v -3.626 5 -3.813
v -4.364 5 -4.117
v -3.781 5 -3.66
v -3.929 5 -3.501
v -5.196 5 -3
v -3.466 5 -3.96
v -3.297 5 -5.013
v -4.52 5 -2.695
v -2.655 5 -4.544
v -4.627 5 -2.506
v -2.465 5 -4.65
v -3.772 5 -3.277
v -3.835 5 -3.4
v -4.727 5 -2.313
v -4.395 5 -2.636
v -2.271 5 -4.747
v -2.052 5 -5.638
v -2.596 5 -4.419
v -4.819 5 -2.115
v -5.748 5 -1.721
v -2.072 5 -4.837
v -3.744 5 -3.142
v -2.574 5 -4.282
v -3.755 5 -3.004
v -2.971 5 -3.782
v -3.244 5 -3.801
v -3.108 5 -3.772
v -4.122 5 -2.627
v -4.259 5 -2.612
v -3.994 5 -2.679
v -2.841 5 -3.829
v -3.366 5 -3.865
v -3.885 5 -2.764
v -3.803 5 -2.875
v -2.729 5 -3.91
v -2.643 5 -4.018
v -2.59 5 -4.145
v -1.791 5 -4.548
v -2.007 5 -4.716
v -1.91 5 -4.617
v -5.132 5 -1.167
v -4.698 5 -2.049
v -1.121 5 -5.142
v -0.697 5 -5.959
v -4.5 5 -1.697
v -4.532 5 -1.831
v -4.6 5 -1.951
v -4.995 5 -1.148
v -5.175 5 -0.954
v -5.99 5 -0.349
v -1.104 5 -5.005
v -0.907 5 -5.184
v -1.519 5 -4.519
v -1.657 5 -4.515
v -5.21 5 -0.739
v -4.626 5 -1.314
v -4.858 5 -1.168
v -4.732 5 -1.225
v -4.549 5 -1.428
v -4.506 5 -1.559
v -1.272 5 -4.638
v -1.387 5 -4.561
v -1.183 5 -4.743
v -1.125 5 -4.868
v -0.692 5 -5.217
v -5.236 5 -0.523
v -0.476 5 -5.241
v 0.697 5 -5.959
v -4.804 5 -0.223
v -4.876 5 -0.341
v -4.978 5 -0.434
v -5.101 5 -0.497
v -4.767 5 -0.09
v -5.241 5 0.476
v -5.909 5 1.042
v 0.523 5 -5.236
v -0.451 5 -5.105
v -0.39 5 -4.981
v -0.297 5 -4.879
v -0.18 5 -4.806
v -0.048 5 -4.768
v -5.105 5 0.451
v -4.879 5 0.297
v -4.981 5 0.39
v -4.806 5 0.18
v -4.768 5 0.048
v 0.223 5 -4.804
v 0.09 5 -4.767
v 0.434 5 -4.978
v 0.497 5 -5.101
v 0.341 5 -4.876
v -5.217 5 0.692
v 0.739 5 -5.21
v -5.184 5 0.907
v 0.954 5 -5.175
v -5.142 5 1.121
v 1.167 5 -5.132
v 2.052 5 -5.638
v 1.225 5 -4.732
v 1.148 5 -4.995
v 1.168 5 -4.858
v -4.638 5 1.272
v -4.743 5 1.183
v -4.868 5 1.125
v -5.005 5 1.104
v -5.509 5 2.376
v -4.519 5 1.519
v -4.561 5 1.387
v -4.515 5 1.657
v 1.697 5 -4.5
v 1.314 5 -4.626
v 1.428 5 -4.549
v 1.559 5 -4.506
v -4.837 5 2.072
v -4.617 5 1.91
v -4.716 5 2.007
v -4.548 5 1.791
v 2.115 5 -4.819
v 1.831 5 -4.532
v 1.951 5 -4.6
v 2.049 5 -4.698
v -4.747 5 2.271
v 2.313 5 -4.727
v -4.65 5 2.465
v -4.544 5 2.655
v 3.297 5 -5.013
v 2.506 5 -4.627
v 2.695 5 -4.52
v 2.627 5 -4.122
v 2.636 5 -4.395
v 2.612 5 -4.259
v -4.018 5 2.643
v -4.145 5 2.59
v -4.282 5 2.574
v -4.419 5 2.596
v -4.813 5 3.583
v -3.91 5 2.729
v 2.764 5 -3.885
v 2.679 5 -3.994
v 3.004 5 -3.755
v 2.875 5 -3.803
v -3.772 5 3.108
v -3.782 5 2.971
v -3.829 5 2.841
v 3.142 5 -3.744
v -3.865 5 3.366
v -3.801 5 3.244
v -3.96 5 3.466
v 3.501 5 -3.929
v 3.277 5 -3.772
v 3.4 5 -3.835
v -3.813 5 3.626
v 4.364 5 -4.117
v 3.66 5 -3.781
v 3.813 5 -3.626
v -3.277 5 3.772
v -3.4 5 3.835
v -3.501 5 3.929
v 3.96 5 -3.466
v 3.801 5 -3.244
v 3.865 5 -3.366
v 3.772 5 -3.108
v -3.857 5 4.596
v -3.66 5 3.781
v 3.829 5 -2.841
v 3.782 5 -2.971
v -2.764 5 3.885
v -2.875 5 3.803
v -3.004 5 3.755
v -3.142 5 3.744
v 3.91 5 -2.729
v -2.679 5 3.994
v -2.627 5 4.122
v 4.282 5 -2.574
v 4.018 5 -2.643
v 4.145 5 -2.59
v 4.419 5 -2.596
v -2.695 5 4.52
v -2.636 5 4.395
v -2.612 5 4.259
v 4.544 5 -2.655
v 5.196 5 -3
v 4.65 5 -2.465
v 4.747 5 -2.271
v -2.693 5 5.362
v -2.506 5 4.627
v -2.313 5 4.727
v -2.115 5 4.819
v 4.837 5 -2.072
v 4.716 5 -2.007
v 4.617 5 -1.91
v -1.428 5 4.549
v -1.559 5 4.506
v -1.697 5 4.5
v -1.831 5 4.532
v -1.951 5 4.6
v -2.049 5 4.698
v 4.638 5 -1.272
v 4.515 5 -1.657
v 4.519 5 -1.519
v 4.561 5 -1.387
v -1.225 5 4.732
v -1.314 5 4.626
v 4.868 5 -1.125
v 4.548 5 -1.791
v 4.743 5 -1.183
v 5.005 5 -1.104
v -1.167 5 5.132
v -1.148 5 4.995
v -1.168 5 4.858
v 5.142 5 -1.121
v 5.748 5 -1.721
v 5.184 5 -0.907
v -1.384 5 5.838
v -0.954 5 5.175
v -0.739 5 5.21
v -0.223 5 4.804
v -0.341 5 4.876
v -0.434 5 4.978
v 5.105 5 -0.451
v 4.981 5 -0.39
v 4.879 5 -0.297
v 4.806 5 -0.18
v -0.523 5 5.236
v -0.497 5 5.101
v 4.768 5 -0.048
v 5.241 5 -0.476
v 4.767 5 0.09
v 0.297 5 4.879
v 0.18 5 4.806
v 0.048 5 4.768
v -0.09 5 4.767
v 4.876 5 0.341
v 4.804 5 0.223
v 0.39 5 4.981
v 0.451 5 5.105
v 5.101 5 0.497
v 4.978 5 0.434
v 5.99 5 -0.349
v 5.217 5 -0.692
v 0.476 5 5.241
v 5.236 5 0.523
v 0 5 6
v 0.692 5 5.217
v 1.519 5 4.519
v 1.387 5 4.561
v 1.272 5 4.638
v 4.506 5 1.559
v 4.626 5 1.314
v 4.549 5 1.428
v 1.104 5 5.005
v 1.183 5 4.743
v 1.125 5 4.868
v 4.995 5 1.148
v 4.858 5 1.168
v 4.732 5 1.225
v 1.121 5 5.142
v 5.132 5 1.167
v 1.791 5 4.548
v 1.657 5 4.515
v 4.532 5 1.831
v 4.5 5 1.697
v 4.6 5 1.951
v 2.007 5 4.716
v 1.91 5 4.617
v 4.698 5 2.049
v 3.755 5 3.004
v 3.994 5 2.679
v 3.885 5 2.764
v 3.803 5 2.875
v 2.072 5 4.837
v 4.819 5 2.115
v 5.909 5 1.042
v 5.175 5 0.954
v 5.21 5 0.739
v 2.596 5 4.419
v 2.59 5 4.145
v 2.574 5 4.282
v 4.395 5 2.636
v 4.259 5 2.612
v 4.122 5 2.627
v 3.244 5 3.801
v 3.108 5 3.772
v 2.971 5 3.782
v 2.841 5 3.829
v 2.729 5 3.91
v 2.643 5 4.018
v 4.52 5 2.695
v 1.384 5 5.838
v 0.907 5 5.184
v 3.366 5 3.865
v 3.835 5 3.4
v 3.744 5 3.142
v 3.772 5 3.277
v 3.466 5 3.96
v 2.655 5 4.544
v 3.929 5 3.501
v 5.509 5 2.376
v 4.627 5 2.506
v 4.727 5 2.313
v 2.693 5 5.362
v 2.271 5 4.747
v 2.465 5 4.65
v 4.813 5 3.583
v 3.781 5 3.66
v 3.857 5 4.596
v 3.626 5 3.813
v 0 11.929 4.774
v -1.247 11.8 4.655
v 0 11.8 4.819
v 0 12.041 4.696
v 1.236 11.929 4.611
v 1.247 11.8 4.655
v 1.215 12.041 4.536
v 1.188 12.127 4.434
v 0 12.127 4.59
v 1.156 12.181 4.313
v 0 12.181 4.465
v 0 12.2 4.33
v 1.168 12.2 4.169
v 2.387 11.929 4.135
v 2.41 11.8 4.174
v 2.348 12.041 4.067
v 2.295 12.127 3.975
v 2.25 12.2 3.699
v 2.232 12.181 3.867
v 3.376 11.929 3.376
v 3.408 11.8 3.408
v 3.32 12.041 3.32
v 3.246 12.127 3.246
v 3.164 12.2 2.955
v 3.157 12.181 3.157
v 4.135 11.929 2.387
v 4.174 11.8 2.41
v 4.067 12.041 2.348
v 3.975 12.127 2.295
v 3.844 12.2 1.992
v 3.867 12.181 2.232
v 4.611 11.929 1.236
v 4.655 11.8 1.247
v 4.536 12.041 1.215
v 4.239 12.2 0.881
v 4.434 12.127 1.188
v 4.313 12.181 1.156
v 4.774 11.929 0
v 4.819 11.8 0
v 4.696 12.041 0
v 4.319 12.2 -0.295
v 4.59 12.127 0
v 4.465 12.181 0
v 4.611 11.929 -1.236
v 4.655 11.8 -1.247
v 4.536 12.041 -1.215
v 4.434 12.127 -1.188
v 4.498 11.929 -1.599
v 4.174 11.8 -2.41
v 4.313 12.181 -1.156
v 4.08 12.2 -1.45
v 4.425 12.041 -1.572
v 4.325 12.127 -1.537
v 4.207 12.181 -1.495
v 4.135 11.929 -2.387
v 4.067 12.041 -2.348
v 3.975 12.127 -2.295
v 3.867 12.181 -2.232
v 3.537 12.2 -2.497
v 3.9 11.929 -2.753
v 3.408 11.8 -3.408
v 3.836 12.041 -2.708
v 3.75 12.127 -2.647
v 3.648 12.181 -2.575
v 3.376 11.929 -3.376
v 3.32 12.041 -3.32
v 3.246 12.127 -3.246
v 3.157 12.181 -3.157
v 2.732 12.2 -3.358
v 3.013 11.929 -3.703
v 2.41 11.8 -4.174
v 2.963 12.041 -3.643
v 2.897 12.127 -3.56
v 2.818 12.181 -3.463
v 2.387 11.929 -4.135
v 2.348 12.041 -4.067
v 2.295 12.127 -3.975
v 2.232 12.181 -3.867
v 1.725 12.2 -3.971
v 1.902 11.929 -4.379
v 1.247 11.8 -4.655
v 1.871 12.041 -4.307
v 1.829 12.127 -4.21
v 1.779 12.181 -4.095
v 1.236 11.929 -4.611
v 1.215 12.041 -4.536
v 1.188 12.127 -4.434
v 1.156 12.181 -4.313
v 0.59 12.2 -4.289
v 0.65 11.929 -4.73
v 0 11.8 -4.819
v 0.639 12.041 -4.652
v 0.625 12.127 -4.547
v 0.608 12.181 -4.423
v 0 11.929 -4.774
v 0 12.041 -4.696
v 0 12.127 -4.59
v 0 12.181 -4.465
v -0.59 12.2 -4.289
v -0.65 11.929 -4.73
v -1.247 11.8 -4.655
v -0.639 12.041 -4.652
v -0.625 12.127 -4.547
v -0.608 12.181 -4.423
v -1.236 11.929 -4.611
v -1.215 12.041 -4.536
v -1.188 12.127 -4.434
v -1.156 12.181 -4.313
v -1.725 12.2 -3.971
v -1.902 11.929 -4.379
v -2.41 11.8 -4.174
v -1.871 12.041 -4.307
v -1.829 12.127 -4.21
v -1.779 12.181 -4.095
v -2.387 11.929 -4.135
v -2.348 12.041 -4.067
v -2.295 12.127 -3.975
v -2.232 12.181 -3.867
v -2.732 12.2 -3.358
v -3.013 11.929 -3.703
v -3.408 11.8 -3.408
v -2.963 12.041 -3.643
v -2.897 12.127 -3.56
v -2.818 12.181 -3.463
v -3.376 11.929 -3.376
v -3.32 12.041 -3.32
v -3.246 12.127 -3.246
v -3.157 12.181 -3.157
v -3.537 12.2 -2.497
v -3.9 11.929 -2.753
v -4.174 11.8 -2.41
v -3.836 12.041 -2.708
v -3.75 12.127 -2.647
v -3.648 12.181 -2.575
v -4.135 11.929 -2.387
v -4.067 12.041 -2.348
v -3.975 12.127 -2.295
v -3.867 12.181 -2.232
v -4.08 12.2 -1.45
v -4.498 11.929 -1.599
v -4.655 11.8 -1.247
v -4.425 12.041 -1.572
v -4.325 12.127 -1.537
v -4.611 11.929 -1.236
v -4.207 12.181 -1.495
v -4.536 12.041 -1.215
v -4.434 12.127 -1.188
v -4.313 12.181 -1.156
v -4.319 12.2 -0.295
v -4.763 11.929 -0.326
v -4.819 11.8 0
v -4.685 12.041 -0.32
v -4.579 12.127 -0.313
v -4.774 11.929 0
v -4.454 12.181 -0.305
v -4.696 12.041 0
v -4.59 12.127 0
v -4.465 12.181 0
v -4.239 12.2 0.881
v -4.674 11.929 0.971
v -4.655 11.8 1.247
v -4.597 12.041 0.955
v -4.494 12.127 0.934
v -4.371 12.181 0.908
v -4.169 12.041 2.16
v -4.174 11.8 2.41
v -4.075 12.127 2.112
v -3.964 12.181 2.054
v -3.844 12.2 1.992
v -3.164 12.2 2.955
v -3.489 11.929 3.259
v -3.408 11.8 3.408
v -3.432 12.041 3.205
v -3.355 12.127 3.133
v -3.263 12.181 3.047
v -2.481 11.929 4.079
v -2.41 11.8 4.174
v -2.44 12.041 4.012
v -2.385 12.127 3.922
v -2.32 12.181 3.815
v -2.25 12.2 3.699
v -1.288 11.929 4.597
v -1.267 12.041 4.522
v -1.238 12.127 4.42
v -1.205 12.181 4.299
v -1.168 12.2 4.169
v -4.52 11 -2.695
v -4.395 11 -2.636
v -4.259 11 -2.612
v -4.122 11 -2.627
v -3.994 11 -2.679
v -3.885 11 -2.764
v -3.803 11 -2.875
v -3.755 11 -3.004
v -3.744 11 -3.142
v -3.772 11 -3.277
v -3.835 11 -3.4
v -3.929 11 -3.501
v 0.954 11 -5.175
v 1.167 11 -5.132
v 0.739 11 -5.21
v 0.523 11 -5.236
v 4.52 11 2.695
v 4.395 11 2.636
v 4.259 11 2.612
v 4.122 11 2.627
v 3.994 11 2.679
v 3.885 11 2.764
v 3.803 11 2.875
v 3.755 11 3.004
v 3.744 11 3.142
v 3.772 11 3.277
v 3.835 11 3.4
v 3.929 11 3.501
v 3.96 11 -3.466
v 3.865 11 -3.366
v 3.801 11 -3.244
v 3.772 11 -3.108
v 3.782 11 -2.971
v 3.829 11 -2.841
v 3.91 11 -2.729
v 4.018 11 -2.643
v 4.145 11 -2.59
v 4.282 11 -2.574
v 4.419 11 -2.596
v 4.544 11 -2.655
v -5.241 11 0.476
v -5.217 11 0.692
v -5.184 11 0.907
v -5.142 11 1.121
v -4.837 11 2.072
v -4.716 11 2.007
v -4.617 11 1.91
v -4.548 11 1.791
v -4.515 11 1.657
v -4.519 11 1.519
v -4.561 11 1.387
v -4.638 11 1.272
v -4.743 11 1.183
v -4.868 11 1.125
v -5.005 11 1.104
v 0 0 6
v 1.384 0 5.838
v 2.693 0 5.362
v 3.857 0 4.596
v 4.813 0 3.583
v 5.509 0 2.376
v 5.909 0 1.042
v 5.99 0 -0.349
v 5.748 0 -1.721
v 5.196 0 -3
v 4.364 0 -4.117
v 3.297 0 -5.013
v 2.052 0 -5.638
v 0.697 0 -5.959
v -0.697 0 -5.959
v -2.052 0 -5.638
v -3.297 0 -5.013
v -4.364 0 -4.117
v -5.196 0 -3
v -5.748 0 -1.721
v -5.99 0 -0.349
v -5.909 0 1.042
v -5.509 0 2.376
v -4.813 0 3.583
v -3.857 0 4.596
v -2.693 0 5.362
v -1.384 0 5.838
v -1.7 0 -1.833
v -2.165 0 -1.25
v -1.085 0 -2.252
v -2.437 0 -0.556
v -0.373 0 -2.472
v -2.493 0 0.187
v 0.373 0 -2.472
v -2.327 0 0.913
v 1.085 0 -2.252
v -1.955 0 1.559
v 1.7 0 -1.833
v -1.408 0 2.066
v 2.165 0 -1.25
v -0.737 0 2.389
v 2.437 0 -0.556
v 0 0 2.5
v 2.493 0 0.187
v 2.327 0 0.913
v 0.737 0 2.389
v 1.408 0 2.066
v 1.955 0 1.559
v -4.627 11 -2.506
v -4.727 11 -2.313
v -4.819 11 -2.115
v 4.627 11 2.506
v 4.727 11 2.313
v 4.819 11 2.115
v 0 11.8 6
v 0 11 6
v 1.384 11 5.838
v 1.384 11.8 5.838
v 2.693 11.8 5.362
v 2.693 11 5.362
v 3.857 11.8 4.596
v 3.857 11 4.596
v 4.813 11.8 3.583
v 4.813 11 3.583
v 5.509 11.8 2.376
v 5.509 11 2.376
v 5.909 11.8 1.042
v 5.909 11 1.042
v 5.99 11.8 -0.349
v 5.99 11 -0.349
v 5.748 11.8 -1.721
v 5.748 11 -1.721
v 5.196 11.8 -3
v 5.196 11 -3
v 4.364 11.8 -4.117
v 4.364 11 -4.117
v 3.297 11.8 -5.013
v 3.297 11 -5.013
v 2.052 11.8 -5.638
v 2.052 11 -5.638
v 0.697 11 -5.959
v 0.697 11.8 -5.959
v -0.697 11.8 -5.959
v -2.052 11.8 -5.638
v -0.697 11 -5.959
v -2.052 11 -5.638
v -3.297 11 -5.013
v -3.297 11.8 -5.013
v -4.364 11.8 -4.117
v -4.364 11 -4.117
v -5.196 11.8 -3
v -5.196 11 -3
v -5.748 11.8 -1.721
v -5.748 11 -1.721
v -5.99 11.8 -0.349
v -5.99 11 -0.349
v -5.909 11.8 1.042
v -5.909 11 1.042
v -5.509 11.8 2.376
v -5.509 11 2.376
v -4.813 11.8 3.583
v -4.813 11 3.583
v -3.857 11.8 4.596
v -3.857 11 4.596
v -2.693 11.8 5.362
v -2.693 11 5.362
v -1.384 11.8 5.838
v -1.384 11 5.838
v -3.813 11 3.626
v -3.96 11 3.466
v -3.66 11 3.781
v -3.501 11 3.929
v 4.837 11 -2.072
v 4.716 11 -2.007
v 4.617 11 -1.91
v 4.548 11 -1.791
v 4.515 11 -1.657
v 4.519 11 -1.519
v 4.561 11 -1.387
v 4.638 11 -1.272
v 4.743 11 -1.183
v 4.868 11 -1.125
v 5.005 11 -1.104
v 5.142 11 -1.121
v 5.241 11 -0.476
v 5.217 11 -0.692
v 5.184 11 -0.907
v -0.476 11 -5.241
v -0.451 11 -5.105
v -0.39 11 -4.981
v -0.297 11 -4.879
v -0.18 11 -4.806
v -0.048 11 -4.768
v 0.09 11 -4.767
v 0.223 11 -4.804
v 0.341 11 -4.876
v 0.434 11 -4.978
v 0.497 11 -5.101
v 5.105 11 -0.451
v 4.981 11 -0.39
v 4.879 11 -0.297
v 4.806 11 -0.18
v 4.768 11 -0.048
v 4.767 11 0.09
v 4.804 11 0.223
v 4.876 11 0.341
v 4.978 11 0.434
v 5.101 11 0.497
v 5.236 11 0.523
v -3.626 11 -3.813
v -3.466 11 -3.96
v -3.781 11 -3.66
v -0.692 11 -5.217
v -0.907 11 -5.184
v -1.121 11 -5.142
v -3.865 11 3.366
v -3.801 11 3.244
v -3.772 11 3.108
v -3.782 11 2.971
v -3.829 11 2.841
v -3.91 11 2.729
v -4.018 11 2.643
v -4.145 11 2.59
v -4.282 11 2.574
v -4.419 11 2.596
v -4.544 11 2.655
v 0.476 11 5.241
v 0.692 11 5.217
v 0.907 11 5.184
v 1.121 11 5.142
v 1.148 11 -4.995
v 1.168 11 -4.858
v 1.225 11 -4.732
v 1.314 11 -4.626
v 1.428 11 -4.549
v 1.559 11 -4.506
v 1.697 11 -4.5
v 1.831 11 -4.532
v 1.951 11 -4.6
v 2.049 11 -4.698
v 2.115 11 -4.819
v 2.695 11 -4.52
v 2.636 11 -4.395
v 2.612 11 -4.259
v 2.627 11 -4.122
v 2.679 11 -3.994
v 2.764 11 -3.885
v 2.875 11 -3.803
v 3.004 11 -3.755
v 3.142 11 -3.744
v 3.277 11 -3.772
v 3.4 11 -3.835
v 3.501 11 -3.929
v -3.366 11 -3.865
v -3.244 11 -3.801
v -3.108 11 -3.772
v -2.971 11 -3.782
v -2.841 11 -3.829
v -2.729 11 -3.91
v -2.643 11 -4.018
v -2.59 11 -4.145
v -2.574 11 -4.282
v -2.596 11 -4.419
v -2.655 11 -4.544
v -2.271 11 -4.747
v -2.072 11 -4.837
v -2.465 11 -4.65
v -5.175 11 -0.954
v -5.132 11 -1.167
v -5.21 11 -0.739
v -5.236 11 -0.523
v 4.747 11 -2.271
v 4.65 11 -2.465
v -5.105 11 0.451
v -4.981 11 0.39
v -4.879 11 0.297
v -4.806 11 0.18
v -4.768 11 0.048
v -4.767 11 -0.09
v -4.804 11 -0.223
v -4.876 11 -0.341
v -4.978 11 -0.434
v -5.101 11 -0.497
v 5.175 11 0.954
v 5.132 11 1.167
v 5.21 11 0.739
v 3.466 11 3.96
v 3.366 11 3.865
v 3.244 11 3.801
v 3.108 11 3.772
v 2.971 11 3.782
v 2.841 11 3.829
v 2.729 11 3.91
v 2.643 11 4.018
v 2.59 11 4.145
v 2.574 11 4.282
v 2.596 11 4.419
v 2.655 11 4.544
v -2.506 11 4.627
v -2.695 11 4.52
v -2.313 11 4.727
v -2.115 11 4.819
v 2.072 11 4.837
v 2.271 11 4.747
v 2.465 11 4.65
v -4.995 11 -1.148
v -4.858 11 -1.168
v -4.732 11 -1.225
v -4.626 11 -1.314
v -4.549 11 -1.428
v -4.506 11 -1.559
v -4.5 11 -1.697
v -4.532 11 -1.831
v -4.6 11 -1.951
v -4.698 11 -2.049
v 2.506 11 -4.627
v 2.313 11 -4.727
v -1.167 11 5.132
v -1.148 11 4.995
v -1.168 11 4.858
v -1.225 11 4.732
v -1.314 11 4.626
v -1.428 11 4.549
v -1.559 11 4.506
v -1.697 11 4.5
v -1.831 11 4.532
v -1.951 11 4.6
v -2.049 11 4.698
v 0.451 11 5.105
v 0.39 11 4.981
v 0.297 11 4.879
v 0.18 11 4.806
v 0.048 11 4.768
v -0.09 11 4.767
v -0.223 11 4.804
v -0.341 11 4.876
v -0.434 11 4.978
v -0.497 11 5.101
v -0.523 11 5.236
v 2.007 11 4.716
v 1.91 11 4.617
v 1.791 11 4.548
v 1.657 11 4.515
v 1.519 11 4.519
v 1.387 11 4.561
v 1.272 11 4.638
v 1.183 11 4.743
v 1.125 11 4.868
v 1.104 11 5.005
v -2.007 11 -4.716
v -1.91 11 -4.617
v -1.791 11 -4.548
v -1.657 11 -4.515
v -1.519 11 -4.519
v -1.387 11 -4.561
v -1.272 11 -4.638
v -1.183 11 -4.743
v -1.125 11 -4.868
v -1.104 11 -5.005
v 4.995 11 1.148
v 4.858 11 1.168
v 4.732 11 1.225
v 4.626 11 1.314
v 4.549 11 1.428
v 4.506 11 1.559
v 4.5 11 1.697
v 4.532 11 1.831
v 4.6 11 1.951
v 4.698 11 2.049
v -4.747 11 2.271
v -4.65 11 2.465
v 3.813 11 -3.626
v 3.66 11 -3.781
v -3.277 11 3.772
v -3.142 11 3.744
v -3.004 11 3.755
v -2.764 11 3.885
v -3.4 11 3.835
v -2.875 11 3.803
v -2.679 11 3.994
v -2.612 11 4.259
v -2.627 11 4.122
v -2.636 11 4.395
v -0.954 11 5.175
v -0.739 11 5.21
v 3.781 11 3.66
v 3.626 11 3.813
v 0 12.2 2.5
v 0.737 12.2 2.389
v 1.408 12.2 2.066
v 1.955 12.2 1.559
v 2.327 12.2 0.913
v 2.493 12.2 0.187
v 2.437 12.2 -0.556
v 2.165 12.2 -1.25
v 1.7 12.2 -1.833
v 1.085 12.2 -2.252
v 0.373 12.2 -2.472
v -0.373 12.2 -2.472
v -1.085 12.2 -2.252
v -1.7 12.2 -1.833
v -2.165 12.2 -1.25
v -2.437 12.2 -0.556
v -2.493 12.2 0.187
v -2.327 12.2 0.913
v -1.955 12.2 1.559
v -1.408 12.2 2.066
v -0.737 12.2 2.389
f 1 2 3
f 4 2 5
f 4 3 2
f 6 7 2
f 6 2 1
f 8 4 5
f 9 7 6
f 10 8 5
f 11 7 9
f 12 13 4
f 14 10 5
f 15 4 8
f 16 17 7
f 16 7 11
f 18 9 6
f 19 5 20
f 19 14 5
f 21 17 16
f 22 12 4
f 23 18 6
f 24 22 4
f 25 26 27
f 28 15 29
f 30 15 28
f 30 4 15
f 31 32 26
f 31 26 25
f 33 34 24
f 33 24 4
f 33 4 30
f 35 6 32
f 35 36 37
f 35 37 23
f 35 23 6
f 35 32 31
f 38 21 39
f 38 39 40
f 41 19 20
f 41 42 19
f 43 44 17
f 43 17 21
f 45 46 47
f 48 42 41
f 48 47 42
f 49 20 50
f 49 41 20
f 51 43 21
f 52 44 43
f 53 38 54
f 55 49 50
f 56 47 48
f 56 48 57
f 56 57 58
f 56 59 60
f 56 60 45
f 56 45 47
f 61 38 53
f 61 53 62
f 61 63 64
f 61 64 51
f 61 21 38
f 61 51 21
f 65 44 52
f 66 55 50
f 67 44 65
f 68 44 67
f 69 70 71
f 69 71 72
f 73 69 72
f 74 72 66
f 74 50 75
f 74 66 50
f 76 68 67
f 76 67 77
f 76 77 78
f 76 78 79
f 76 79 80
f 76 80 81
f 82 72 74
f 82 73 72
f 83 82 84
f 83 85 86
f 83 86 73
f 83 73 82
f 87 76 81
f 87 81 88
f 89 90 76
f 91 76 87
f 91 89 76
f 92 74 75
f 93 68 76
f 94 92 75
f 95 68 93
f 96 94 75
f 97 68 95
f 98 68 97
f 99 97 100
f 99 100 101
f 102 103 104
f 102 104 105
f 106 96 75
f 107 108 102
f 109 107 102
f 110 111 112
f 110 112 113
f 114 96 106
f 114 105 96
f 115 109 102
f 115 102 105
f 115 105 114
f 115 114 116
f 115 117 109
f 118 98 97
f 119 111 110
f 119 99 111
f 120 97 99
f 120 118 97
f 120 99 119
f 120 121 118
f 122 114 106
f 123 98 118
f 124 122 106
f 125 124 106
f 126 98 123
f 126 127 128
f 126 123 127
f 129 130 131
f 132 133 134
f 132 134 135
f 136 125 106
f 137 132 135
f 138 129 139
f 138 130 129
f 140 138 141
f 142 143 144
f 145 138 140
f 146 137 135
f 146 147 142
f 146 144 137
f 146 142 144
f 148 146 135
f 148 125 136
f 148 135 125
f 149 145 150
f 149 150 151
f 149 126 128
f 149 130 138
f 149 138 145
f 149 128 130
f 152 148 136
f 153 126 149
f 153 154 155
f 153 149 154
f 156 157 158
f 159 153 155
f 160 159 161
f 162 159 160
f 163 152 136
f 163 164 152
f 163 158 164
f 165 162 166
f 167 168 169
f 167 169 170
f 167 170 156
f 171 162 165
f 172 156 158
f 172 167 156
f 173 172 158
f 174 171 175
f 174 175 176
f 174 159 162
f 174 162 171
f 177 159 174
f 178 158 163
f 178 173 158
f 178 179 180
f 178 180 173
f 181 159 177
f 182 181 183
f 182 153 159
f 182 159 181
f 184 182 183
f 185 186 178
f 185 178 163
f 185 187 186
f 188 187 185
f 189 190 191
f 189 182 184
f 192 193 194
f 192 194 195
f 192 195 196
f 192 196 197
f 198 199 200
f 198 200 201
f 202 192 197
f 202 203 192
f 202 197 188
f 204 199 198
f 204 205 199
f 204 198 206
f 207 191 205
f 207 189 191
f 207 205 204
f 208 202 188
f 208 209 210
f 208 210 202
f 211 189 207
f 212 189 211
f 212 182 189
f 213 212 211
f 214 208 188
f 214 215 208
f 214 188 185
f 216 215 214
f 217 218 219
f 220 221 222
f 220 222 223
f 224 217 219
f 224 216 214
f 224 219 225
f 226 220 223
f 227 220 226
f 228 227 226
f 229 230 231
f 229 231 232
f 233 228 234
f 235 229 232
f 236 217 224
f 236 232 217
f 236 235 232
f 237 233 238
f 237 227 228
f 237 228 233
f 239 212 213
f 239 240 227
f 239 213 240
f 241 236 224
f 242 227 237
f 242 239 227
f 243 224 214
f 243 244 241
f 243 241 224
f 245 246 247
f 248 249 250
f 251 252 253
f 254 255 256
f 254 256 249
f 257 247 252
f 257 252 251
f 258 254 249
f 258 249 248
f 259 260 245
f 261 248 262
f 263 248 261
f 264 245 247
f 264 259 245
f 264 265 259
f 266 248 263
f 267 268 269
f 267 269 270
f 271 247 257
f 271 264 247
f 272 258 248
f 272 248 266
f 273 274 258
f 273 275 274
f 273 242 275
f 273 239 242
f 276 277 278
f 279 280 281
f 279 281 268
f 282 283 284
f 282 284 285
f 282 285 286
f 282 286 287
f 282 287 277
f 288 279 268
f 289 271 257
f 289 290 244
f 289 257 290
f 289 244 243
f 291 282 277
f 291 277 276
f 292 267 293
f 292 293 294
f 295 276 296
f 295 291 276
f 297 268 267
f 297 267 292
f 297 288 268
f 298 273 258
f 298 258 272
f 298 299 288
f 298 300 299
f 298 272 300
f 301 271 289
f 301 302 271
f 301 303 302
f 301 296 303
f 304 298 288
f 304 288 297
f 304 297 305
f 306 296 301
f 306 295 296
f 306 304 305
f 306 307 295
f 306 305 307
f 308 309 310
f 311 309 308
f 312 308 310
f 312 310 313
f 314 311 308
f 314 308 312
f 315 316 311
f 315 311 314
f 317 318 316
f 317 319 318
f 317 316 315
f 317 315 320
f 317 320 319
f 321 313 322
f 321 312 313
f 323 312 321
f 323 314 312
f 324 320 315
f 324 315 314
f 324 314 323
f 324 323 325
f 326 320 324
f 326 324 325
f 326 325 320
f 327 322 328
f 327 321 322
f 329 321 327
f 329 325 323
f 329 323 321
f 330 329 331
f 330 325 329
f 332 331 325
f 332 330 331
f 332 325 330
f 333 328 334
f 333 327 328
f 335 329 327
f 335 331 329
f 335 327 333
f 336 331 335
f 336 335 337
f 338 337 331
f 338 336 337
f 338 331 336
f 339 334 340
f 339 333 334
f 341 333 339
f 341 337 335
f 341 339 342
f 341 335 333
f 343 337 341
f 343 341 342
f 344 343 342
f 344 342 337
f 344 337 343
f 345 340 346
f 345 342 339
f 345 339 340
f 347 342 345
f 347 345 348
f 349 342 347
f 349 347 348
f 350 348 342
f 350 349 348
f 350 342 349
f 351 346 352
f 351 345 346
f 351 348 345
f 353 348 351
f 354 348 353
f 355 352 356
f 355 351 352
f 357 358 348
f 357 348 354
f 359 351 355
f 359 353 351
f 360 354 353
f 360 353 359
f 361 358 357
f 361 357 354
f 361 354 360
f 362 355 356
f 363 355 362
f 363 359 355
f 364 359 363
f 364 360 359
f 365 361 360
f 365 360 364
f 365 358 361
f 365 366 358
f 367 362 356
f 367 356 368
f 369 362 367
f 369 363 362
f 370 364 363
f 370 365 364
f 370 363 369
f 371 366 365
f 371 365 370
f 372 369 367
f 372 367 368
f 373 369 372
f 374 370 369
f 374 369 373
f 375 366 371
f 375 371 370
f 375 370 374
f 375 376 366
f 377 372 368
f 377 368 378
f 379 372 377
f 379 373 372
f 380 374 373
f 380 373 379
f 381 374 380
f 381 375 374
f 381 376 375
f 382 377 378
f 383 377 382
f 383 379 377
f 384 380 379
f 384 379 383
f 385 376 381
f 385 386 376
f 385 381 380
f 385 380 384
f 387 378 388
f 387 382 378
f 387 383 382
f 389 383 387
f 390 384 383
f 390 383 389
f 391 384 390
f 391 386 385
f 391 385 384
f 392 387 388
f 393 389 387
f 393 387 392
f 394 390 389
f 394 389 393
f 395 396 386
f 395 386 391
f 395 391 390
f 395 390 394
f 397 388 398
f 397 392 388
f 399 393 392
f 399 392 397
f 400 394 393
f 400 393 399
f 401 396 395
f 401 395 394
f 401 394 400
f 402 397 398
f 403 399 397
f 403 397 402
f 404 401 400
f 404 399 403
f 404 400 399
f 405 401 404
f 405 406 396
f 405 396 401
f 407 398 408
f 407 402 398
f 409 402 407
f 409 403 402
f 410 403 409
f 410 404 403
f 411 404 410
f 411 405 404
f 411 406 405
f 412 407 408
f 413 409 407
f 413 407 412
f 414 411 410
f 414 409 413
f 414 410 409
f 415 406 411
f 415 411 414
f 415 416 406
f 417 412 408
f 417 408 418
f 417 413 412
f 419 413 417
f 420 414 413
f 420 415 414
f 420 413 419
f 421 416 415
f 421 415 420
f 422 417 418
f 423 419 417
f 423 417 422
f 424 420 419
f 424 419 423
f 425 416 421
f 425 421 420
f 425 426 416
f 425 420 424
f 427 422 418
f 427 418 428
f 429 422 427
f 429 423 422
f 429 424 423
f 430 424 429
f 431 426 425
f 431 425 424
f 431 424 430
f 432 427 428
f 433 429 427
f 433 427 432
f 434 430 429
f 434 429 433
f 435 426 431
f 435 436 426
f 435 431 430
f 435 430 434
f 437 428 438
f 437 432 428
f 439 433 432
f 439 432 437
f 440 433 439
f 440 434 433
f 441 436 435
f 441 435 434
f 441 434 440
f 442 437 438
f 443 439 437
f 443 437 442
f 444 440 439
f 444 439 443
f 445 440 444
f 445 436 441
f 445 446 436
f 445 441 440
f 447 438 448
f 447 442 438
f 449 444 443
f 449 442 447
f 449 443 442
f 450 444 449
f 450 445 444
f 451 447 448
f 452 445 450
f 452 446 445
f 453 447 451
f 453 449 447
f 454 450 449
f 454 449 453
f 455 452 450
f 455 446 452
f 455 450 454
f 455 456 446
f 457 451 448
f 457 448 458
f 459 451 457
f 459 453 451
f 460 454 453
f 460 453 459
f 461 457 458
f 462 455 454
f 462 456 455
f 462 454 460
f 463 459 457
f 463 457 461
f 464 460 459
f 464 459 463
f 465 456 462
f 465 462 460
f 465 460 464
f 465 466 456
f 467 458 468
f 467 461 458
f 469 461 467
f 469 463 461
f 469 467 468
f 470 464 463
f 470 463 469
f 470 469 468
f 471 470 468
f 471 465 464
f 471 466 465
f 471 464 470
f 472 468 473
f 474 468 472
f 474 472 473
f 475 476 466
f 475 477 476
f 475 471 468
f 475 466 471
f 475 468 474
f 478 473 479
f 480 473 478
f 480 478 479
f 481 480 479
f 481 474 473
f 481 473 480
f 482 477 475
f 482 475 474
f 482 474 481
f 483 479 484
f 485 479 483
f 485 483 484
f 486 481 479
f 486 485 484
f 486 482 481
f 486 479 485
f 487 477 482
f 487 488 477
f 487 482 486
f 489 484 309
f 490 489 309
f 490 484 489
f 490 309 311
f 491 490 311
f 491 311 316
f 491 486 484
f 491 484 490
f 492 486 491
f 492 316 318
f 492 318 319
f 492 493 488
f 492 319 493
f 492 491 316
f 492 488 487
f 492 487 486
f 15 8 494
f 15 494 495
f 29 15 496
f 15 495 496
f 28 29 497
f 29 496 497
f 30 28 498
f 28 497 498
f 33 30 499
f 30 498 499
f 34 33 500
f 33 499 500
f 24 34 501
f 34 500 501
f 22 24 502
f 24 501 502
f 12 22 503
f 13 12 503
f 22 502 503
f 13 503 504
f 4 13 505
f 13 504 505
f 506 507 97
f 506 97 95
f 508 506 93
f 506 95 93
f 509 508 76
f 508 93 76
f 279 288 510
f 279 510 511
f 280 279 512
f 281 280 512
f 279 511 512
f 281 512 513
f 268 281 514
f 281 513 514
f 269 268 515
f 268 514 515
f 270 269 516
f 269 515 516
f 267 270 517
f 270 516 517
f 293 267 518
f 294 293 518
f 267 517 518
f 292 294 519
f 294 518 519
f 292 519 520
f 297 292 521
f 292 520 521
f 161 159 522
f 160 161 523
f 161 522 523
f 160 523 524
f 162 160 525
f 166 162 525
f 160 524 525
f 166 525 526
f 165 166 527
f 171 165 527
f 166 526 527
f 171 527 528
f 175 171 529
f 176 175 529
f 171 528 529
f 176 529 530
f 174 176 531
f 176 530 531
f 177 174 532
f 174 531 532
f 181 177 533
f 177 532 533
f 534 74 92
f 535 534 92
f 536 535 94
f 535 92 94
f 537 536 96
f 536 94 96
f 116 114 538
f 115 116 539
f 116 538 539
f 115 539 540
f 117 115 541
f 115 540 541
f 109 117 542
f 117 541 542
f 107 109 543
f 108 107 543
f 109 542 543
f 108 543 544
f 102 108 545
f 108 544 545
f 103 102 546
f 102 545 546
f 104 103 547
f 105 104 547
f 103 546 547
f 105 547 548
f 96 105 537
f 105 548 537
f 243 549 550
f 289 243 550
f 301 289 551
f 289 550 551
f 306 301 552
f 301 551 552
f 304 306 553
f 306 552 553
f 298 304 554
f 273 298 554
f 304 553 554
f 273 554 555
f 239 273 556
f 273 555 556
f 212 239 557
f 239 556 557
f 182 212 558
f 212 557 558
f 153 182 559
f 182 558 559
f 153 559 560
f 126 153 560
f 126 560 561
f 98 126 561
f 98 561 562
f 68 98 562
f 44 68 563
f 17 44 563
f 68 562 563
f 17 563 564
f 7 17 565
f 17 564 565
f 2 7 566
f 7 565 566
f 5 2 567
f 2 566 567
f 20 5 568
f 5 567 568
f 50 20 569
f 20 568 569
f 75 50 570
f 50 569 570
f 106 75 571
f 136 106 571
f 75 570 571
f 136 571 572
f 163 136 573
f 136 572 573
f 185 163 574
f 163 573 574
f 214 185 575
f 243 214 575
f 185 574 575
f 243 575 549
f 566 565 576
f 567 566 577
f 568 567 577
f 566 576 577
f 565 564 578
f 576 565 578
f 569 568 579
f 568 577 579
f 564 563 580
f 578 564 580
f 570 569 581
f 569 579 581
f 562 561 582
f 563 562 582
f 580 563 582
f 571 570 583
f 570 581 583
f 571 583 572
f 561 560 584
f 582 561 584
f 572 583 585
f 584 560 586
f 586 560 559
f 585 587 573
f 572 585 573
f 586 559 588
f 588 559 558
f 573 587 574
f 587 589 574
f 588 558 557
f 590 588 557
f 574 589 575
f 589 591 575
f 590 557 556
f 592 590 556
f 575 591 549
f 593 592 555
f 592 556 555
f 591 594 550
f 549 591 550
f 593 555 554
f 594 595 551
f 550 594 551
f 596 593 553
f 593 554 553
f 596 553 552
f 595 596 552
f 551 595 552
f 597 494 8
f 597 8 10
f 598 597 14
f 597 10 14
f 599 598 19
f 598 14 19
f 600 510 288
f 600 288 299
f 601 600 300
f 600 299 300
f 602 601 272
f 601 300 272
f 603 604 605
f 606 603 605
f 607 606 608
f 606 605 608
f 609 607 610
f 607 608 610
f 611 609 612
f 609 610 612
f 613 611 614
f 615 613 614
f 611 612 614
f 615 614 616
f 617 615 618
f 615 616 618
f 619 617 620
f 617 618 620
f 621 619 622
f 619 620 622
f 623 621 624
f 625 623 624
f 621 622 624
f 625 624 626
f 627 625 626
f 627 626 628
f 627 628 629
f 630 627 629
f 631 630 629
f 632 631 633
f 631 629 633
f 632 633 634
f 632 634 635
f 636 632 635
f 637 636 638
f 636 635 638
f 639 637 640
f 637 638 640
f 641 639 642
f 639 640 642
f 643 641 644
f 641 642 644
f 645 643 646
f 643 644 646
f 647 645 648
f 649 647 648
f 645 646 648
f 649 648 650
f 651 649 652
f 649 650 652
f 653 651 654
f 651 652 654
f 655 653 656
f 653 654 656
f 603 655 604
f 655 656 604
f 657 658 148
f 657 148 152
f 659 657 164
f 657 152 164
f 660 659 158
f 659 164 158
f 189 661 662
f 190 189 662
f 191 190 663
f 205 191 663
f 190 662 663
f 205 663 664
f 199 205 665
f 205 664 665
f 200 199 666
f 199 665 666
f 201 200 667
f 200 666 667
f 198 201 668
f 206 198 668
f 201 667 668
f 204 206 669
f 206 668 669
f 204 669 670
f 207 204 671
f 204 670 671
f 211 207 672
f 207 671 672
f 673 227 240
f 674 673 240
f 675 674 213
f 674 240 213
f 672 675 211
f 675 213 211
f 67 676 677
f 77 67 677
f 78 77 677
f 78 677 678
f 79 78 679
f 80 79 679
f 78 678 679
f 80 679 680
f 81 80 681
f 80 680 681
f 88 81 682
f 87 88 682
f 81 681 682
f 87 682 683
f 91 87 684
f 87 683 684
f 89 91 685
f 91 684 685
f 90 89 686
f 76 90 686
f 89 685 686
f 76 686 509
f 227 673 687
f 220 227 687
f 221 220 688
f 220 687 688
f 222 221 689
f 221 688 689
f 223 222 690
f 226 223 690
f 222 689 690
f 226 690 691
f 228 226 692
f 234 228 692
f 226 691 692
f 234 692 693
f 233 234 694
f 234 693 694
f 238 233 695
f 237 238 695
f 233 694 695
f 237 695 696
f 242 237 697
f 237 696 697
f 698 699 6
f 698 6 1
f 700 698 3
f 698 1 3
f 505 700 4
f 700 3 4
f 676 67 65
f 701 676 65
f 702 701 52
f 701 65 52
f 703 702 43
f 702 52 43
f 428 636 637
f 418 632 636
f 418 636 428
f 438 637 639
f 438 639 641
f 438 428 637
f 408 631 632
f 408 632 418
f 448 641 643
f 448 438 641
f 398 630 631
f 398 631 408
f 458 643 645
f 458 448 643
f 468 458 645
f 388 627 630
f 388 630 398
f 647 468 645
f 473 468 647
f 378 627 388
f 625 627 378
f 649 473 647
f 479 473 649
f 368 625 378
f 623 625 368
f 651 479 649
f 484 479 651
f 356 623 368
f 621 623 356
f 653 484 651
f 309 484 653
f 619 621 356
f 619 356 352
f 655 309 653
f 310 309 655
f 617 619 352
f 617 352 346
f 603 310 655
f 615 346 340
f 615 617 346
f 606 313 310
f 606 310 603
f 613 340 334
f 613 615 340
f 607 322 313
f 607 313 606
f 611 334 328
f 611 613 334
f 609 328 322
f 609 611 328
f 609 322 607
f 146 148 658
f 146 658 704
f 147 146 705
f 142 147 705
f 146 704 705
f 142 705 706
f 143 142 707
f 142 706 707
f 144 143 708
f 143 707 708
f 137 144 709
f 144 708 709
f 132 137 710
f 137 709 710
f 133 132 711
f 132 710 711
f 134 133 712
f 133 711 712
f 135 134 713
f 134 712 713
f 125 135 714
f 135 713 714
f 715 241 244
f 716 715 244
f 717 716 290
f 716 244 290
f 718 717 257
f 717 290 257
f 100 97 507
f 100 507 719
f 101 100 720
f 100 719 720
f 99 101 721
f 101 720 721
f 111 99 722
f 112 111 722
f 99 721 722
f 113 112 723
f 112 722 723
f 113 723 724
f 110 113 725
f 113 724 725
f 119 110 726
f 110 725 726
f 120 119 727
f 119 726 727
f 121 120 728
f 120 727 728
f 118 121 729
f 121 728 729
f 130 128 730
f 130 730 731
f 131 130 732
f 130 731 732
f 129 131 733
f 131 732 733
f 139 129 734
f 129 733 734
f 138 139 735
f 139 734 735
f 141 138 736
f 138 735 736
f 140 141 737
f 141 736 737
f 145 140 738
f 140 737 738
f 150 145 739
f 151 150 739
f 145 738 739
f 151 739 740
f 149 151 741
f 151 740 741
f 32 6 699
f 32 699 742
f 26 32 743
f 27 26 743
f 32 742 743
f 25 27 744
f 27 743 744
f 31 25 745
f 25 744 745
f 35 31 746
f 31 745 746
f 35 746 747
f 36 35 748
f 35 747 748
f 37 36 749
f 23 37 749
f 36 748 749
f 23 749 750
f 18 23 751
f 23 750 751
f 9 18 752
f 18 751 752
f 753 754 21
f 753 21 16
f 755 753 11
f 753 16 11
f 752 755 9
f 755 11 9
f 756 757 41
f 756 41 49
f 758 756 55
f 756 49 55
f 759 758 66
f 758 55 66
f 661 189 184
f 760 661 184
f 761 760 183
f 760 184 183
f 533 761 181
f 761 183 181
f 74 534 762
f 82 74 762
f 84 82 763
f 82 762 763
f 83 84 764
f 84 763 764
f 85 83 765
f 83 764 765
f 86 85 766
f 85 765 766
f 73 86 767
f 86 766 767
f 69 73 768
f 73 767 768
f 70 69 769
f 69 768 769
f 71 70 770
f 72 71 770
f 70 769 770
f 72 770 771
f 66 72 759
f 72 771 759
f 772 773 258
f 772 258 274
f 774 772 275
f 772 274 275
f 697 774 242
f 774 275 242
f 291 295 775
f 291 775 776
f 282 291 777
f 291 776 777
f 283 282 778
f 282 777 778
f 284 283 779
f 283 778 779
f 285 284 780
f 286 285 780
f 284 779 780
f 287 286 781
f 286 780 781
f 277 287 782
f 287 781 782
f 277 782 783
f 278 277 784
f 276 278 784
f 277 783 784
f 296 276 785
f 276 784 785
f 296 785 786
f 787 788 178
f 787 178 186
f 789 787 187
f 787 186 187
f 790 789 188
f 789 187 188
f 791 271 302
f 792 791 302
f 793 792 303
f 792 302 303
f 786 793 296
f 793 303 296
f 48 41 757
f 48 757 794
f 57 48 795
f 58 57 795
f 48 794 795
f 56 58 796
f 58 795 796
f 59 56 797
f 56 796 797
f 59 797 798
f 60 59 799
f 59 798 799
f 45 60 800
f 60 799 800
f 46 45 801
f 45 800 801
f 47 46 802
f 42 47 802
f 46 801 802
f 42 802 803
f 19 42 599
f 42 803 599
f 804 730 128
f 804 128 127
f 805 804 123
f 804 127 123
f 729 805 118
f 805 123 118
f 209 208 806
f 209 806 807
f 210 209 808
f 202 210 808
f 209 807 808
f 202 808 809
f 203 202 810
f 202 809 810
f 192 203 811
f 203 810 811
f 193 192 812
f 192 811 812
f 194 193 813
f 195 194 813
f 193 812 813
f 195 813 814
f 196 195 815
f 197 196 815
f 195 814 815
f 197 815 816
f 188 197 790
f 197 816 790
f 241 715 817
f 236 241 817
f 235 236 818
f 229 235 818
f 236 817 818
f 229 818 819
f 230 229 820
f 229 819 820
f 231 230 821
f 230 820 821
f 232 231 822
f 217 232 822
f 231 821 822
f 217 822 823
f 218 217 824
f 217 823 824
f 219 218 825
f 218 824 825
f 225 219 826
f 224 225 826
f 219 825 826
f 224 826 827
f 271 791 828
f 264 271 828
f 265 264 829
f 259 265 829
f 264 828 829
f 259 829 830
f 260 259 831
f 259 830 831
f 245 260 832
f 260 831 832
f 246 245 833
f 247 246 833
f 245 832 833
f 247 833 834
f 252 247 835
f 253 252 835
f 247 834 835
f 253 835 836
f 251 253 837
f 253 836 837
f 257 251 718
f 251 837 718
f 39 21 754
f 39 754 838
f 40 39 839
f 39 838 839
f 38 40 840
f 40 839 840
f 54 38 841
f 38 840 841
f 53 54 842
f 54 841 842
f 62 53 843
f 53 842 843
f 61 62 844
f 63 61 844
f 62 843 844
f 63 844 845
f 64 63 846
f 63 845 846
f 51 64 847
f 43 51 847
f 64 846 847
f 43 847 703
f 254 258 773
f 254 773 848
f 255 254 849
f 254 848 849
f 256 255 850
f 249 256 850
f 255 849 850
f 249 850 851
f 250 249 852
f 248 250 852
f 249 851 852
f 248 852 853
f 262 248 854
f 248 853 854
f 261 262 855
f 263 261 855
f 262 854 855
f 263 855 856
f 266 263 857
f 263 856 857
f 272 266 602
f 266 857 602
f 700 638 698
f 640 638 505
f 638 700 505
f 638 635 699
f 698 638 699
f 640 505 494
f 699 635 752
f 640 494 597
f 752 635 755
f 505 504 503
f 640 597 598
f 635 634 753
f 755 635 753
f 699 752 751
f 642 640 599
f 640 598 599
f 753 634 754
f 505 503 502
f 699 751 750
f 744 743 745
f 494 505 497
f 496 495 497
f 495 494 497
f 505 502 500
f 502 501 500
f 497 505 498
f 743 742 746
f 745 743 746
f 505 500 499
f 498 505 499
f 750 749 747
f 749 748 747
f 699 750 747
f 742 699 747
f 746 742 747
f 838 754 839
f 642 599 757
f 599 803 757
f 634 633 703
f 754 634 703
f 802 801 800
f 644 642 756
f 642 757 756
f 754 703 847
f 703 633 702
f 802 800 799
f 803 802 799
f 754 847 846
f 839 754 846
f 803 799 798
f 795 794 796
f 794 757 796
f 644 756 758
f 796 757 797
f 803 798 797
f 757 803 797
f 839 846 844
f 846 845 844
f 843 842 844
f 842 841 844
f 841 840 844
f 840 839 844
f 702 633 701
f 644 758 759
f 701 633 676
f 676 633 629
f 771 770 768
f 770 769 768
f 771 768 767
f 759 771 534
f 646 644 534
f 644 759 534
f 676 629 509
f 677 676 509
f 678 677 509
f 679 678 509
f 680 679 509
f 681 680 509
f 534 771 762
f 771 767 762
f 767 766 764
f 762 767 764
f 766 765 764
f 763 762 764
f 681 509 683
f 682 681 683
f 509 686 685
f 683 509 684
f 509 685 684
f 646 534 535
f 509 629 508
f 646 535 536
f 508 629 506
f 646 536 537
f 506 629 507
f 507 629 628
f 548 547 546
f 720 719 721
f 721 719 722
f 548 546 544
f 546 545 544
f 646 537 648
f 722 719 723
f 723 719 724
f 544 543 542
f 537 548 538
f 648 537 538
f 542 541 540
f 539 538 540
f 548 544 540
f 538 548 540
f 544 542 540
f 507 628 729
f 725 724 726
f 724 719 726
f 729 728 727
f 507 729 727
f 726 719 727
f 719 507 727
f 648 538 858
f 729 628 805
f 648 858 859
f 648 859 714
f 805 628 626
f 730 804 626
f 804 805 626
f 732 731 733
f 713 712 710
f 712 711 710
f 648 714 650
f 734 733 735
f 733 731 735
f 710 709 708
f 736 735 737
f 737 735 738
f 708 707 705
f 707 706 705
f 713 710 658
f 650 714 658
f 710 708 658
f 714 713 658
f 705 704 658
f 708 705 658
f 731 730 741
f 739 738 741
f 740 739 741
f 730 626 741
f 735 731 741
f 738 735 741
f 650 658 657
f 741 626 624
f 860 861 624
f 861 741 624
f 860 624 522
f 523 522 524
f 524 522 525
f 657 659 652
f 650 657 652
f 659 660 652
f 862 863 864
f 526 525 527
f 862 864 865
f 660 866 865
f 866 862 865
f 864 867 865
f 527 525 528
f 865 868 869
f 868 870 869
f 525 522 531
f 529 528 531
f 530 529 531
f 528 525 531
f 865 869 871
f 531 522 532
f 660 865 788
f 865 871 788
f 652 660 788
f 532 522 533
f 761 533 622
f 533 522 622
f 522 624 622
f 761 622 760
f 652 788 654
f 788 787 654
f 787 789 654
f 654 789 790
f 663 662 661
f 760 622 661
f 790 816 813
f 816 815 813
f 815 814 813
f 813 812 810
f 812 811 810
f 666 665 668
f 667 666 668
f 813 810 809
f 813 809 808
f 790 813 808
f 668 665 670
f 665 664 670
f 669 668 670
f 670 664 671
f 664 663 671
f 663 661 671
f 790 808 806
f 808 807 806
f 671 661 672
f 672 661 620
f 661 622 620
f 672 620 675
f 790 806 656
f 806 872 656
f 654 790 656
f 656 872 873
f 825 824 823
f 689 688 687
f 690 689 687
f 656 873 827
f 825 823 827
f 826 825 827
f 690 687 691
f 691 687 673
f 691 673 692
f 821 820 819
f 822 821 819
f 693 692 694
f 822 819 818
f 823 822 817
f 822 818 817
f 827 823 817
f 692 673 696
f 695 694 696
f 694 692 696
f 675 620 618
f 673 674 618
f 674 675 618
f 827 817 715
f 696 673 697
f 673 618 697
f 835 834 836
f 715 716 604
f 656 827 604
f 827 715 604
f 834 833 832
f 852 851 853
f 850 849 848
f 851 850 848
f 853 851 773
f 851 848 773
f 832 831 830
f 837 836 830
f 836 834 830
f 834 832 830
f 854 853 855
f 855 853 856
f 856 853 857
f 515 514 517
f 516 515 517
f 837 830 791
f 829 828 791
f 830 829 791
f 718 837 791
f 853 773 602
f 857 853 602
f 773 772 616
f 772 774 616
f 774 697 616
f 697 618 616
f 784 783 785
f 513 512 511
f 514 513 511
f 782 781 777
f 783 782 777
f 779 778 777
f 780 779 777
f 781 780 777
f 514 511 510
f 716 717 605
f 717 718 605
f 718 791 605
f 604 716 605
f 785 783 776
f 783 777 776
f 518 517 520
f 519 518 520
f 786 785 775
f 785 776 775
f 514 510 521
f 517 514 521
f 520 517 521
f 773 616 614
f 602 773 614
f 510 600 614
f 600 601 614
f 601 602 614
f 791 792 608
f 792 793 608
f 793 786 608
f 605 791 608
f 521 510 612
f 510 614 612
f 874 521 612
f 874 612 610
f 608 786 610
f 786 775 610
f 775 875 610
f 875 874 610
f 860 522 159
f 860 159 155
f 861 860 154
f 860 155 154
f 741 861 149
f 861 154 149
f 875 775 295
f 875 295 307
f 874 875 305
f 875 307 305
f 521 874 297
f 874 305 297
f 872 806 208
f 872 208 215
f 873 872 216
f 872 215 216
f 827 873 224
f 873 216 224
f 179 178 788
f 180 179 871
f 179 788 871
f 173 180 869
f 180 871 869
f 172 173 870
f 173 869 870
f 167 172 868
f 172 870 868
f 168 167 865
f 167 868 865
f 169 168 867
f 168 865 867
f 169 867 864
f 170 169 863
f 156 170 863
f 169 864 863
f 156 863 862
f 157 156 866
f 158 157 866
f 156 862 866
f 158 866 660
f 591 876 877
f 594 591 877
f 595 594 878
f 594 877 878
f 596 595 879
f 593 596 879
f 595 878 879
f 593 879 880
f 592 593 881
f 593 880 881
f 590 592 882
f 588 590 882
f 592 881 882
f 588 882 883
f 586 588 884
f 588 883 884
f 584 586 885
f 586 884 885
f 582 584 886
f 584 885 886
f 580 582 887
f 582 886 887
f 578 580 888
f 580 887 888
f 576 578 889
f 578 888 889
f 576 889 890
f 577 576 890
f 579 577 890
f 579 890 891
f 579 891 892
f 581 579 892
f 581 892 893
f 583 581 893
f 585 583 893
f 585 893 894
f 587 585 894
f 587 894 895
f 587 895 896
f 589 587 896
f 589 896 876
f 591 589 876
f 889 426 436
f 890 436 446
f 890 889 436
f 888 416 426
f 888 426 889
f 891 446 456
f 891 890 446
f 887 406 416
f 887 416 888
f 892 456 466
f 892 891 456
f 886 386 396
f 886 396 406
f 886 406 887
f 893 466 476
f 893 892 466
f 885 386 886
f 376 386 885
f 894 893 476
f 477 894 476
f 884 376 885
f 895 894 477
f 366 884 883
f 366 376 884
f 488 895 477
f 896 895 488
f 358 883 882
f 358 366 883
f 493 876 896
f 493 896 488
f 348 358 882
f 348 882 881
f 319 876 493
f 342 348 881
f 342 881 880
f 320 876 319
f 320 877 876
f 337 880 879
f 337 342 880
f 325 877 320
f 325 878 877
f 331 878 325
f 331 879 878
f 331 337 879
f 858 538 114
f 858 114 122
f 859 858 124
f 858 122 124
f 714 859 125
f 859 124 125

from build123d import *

# Parameters (mm, degrees)
SKETCH1_R           = 6
BOSS_EXTRUDE1_DEPTH = 5
SKETCH2_R           = 5.262480872
BOSS_EXTRUDE2_DEPTH = 6
SKETCH3_R           = 0.5
CUT_EXTRUDE1_DEPTH  = 6
SKETCH4_R           = 6
BOSS_EXTRUDE3_DEPTH = 0.8
SKETCH5_R           = 4.819461856
BOSS_EXTRUDE4_DEPTH = 0.4
FILLET3_R           = 0.5
SKETCH6_R           = 2.5
CUT_EXTRUDE2_DEPTH  = 15.860686391


with BuildPart() as part:
    # Sketch1 → Boss-Extrude1 (new body)
    with BuildSketch(Plane(origin=(0, 0, 0), x_dir=(1, 0, 0), z_dir=(0, 1, 0))):
        with Locations(Location((0, 0, 0), (0, 0, 270))):
            Circle(SKETCH1_R)
    extrude(amount=BOSS_EXTRUDE1_DEPTH)

    # Sketch2 → Boss-Extrude2 (add)
    with BuildSketch(Plane(origin=(0, 5, 0), x_dir=(1, 0, 0), z_dir=(0, 1, 0))):
        with Locations(Location((0, 0, 0), (0, 0, 270))):
            Circle(SKETCH2_R)
    extrude(amount=BOSS_EXTRUDE2_DEPTH)

    # Sketch3 → Cut-Extrude1 (cut)
    with BuildSketch(Plane(origin=(0, 11, 0), x_dir=(1, 0, 0), z_dir=(0, 1, 0))):
        with Locations((-1.603876434, 5.012113856)):
            Circle(SKETCH3_R)
        with Locations((0.023451225, 5.262428619)):
            Circle(SKETCH3_R)
        with Locations((1.648483316, 4.997620202)):
            Circle(SKETCH3_R)
        with Locations((3.112150373, 4.2436099)):
            Circle(SKETCH3_R)
        with Locations((4.271178469, 3.074205493)):
            Circle(SKETCH3_R)
        with Locations((5.012113856, 1.603876434)):
            Circle(SKETCH3_R)
        with Locations((5.262428619, -0.023451225)):
            Circle(SKETCH3_R)
        with Locations((4.997620202, -1.648483316)):
            Circle(SKETCH3_R)
        with Locations((4.2436099, -3.112150373)):
            Circle(SKETCH3_R)
        with Locations((3.074205493, -4.271178469)):
            Circle(SKETCH3_R)
        with Locations((1.603876434, -5.012113856)):
            Circle(SKETCH3_R)
        with Locations((-0.023451225, -5.262428619)):
            Circle(SKETCH3_R)
        with Locations((-1.648483316, -4.997620202)):
            Circle(SKETCH3_R)
        with Locations((-3.112150373, -4.2436099)):
            Circle(SKETCH3_R)
        with Locations((-4.271178469, -3.074205493)):
            Circle(SKETCH3_R)
        with Locations((-5.012113856, -1.603876434)):
            Circle(SKETCH3_R)
        with Locations((-5.262428619, 0.023451225)):
            Circle(SKETCH3_R)
        with Locations((-4.997620202, 1.648483316)):
            Circle(SKETCH3_R)
        with Locations((-4.2436099, 3.112150373)):
            Circle(SKETCH3_R)
        with Locations((-3.074205493, 4.271178469)):
            Circle(SKETCH3_R)
    extrude(amount=-CUT_EXTRUDE1_DEPTH, mode=Mode.SUBTRACT)

    # Sketch4 → Boss-Extrude3 (add)
    with BuildSketch(Plane(origin=(0, 11, 0), x_dir=(1, 0, 0), z_dir=(0, 1, 0))):
        with Locations(Location((0, 0, 0), (0, 0, 270))):
            Circle(SKETCH4_R)
    extrude(amount=BOSS_EXTRUDE3_DEPTH)

    # Sketch5 → Boss-Extrude4 (add)
    with BuildSketch(Plane(origin=(0, 11.8, 0), x_dir=(1, 0, 0), z_dir=(0, 1, 0))):
        with Locations(Location((0, 0, 0), (0, 0, 270))):
            Circle(SKETCH5_R)
    extrude(amount=BOSS_EXTRUDE4_DEPTH)

    # Fillet3
    # the kernel refuses this fillet: 0.5 mm, written as the material it takes off along each edge
    with BuildSketch(Plane(origin=(0, 12.2, 0), x_dir=(0, 0, 1), z_dir=(-1, 0, 0))) as fillet3_piece_1:
        with BuildLine():
            CenterArc((4.329563907, -0.5), FILLET3_R, 11.536959033, 78.463040967)
            Line((4.329563907, 0), (4.329563907, 0.01))
            Line((4.329563907, 0.01), (4.819461856, 0.01))
            Line((4.819461856, 0.01), (4.829461856, 0))
            ThreePointArc((4.829461856, 0), (4.829461856, -0.2), (4.829259815, -0.398))
            Line((4.829259815, -0.398), (4.819461856, -0.4))
        make_face()
    revolve(axis=Axis((0, 12.2, 0), (0, 1, 0)), mode=Mode.SUBTRACT)

    # Sketch6 → Cut-Extrude2 (cut, through all)
    with BuildSketch(Plane(origin=(0, 12.2, 0), x_dir=(1, 0, 0), z_dir=(0, 1, 0))):
        with Locations(Location((0, 0, 0), (0, 0, 270))):
            Circle(SKETCH6_R)
    extrude(amount=-CUT_EXTRUDE2_DEPTH, mode=Mode.SUBTRACT)


solid = part.part
